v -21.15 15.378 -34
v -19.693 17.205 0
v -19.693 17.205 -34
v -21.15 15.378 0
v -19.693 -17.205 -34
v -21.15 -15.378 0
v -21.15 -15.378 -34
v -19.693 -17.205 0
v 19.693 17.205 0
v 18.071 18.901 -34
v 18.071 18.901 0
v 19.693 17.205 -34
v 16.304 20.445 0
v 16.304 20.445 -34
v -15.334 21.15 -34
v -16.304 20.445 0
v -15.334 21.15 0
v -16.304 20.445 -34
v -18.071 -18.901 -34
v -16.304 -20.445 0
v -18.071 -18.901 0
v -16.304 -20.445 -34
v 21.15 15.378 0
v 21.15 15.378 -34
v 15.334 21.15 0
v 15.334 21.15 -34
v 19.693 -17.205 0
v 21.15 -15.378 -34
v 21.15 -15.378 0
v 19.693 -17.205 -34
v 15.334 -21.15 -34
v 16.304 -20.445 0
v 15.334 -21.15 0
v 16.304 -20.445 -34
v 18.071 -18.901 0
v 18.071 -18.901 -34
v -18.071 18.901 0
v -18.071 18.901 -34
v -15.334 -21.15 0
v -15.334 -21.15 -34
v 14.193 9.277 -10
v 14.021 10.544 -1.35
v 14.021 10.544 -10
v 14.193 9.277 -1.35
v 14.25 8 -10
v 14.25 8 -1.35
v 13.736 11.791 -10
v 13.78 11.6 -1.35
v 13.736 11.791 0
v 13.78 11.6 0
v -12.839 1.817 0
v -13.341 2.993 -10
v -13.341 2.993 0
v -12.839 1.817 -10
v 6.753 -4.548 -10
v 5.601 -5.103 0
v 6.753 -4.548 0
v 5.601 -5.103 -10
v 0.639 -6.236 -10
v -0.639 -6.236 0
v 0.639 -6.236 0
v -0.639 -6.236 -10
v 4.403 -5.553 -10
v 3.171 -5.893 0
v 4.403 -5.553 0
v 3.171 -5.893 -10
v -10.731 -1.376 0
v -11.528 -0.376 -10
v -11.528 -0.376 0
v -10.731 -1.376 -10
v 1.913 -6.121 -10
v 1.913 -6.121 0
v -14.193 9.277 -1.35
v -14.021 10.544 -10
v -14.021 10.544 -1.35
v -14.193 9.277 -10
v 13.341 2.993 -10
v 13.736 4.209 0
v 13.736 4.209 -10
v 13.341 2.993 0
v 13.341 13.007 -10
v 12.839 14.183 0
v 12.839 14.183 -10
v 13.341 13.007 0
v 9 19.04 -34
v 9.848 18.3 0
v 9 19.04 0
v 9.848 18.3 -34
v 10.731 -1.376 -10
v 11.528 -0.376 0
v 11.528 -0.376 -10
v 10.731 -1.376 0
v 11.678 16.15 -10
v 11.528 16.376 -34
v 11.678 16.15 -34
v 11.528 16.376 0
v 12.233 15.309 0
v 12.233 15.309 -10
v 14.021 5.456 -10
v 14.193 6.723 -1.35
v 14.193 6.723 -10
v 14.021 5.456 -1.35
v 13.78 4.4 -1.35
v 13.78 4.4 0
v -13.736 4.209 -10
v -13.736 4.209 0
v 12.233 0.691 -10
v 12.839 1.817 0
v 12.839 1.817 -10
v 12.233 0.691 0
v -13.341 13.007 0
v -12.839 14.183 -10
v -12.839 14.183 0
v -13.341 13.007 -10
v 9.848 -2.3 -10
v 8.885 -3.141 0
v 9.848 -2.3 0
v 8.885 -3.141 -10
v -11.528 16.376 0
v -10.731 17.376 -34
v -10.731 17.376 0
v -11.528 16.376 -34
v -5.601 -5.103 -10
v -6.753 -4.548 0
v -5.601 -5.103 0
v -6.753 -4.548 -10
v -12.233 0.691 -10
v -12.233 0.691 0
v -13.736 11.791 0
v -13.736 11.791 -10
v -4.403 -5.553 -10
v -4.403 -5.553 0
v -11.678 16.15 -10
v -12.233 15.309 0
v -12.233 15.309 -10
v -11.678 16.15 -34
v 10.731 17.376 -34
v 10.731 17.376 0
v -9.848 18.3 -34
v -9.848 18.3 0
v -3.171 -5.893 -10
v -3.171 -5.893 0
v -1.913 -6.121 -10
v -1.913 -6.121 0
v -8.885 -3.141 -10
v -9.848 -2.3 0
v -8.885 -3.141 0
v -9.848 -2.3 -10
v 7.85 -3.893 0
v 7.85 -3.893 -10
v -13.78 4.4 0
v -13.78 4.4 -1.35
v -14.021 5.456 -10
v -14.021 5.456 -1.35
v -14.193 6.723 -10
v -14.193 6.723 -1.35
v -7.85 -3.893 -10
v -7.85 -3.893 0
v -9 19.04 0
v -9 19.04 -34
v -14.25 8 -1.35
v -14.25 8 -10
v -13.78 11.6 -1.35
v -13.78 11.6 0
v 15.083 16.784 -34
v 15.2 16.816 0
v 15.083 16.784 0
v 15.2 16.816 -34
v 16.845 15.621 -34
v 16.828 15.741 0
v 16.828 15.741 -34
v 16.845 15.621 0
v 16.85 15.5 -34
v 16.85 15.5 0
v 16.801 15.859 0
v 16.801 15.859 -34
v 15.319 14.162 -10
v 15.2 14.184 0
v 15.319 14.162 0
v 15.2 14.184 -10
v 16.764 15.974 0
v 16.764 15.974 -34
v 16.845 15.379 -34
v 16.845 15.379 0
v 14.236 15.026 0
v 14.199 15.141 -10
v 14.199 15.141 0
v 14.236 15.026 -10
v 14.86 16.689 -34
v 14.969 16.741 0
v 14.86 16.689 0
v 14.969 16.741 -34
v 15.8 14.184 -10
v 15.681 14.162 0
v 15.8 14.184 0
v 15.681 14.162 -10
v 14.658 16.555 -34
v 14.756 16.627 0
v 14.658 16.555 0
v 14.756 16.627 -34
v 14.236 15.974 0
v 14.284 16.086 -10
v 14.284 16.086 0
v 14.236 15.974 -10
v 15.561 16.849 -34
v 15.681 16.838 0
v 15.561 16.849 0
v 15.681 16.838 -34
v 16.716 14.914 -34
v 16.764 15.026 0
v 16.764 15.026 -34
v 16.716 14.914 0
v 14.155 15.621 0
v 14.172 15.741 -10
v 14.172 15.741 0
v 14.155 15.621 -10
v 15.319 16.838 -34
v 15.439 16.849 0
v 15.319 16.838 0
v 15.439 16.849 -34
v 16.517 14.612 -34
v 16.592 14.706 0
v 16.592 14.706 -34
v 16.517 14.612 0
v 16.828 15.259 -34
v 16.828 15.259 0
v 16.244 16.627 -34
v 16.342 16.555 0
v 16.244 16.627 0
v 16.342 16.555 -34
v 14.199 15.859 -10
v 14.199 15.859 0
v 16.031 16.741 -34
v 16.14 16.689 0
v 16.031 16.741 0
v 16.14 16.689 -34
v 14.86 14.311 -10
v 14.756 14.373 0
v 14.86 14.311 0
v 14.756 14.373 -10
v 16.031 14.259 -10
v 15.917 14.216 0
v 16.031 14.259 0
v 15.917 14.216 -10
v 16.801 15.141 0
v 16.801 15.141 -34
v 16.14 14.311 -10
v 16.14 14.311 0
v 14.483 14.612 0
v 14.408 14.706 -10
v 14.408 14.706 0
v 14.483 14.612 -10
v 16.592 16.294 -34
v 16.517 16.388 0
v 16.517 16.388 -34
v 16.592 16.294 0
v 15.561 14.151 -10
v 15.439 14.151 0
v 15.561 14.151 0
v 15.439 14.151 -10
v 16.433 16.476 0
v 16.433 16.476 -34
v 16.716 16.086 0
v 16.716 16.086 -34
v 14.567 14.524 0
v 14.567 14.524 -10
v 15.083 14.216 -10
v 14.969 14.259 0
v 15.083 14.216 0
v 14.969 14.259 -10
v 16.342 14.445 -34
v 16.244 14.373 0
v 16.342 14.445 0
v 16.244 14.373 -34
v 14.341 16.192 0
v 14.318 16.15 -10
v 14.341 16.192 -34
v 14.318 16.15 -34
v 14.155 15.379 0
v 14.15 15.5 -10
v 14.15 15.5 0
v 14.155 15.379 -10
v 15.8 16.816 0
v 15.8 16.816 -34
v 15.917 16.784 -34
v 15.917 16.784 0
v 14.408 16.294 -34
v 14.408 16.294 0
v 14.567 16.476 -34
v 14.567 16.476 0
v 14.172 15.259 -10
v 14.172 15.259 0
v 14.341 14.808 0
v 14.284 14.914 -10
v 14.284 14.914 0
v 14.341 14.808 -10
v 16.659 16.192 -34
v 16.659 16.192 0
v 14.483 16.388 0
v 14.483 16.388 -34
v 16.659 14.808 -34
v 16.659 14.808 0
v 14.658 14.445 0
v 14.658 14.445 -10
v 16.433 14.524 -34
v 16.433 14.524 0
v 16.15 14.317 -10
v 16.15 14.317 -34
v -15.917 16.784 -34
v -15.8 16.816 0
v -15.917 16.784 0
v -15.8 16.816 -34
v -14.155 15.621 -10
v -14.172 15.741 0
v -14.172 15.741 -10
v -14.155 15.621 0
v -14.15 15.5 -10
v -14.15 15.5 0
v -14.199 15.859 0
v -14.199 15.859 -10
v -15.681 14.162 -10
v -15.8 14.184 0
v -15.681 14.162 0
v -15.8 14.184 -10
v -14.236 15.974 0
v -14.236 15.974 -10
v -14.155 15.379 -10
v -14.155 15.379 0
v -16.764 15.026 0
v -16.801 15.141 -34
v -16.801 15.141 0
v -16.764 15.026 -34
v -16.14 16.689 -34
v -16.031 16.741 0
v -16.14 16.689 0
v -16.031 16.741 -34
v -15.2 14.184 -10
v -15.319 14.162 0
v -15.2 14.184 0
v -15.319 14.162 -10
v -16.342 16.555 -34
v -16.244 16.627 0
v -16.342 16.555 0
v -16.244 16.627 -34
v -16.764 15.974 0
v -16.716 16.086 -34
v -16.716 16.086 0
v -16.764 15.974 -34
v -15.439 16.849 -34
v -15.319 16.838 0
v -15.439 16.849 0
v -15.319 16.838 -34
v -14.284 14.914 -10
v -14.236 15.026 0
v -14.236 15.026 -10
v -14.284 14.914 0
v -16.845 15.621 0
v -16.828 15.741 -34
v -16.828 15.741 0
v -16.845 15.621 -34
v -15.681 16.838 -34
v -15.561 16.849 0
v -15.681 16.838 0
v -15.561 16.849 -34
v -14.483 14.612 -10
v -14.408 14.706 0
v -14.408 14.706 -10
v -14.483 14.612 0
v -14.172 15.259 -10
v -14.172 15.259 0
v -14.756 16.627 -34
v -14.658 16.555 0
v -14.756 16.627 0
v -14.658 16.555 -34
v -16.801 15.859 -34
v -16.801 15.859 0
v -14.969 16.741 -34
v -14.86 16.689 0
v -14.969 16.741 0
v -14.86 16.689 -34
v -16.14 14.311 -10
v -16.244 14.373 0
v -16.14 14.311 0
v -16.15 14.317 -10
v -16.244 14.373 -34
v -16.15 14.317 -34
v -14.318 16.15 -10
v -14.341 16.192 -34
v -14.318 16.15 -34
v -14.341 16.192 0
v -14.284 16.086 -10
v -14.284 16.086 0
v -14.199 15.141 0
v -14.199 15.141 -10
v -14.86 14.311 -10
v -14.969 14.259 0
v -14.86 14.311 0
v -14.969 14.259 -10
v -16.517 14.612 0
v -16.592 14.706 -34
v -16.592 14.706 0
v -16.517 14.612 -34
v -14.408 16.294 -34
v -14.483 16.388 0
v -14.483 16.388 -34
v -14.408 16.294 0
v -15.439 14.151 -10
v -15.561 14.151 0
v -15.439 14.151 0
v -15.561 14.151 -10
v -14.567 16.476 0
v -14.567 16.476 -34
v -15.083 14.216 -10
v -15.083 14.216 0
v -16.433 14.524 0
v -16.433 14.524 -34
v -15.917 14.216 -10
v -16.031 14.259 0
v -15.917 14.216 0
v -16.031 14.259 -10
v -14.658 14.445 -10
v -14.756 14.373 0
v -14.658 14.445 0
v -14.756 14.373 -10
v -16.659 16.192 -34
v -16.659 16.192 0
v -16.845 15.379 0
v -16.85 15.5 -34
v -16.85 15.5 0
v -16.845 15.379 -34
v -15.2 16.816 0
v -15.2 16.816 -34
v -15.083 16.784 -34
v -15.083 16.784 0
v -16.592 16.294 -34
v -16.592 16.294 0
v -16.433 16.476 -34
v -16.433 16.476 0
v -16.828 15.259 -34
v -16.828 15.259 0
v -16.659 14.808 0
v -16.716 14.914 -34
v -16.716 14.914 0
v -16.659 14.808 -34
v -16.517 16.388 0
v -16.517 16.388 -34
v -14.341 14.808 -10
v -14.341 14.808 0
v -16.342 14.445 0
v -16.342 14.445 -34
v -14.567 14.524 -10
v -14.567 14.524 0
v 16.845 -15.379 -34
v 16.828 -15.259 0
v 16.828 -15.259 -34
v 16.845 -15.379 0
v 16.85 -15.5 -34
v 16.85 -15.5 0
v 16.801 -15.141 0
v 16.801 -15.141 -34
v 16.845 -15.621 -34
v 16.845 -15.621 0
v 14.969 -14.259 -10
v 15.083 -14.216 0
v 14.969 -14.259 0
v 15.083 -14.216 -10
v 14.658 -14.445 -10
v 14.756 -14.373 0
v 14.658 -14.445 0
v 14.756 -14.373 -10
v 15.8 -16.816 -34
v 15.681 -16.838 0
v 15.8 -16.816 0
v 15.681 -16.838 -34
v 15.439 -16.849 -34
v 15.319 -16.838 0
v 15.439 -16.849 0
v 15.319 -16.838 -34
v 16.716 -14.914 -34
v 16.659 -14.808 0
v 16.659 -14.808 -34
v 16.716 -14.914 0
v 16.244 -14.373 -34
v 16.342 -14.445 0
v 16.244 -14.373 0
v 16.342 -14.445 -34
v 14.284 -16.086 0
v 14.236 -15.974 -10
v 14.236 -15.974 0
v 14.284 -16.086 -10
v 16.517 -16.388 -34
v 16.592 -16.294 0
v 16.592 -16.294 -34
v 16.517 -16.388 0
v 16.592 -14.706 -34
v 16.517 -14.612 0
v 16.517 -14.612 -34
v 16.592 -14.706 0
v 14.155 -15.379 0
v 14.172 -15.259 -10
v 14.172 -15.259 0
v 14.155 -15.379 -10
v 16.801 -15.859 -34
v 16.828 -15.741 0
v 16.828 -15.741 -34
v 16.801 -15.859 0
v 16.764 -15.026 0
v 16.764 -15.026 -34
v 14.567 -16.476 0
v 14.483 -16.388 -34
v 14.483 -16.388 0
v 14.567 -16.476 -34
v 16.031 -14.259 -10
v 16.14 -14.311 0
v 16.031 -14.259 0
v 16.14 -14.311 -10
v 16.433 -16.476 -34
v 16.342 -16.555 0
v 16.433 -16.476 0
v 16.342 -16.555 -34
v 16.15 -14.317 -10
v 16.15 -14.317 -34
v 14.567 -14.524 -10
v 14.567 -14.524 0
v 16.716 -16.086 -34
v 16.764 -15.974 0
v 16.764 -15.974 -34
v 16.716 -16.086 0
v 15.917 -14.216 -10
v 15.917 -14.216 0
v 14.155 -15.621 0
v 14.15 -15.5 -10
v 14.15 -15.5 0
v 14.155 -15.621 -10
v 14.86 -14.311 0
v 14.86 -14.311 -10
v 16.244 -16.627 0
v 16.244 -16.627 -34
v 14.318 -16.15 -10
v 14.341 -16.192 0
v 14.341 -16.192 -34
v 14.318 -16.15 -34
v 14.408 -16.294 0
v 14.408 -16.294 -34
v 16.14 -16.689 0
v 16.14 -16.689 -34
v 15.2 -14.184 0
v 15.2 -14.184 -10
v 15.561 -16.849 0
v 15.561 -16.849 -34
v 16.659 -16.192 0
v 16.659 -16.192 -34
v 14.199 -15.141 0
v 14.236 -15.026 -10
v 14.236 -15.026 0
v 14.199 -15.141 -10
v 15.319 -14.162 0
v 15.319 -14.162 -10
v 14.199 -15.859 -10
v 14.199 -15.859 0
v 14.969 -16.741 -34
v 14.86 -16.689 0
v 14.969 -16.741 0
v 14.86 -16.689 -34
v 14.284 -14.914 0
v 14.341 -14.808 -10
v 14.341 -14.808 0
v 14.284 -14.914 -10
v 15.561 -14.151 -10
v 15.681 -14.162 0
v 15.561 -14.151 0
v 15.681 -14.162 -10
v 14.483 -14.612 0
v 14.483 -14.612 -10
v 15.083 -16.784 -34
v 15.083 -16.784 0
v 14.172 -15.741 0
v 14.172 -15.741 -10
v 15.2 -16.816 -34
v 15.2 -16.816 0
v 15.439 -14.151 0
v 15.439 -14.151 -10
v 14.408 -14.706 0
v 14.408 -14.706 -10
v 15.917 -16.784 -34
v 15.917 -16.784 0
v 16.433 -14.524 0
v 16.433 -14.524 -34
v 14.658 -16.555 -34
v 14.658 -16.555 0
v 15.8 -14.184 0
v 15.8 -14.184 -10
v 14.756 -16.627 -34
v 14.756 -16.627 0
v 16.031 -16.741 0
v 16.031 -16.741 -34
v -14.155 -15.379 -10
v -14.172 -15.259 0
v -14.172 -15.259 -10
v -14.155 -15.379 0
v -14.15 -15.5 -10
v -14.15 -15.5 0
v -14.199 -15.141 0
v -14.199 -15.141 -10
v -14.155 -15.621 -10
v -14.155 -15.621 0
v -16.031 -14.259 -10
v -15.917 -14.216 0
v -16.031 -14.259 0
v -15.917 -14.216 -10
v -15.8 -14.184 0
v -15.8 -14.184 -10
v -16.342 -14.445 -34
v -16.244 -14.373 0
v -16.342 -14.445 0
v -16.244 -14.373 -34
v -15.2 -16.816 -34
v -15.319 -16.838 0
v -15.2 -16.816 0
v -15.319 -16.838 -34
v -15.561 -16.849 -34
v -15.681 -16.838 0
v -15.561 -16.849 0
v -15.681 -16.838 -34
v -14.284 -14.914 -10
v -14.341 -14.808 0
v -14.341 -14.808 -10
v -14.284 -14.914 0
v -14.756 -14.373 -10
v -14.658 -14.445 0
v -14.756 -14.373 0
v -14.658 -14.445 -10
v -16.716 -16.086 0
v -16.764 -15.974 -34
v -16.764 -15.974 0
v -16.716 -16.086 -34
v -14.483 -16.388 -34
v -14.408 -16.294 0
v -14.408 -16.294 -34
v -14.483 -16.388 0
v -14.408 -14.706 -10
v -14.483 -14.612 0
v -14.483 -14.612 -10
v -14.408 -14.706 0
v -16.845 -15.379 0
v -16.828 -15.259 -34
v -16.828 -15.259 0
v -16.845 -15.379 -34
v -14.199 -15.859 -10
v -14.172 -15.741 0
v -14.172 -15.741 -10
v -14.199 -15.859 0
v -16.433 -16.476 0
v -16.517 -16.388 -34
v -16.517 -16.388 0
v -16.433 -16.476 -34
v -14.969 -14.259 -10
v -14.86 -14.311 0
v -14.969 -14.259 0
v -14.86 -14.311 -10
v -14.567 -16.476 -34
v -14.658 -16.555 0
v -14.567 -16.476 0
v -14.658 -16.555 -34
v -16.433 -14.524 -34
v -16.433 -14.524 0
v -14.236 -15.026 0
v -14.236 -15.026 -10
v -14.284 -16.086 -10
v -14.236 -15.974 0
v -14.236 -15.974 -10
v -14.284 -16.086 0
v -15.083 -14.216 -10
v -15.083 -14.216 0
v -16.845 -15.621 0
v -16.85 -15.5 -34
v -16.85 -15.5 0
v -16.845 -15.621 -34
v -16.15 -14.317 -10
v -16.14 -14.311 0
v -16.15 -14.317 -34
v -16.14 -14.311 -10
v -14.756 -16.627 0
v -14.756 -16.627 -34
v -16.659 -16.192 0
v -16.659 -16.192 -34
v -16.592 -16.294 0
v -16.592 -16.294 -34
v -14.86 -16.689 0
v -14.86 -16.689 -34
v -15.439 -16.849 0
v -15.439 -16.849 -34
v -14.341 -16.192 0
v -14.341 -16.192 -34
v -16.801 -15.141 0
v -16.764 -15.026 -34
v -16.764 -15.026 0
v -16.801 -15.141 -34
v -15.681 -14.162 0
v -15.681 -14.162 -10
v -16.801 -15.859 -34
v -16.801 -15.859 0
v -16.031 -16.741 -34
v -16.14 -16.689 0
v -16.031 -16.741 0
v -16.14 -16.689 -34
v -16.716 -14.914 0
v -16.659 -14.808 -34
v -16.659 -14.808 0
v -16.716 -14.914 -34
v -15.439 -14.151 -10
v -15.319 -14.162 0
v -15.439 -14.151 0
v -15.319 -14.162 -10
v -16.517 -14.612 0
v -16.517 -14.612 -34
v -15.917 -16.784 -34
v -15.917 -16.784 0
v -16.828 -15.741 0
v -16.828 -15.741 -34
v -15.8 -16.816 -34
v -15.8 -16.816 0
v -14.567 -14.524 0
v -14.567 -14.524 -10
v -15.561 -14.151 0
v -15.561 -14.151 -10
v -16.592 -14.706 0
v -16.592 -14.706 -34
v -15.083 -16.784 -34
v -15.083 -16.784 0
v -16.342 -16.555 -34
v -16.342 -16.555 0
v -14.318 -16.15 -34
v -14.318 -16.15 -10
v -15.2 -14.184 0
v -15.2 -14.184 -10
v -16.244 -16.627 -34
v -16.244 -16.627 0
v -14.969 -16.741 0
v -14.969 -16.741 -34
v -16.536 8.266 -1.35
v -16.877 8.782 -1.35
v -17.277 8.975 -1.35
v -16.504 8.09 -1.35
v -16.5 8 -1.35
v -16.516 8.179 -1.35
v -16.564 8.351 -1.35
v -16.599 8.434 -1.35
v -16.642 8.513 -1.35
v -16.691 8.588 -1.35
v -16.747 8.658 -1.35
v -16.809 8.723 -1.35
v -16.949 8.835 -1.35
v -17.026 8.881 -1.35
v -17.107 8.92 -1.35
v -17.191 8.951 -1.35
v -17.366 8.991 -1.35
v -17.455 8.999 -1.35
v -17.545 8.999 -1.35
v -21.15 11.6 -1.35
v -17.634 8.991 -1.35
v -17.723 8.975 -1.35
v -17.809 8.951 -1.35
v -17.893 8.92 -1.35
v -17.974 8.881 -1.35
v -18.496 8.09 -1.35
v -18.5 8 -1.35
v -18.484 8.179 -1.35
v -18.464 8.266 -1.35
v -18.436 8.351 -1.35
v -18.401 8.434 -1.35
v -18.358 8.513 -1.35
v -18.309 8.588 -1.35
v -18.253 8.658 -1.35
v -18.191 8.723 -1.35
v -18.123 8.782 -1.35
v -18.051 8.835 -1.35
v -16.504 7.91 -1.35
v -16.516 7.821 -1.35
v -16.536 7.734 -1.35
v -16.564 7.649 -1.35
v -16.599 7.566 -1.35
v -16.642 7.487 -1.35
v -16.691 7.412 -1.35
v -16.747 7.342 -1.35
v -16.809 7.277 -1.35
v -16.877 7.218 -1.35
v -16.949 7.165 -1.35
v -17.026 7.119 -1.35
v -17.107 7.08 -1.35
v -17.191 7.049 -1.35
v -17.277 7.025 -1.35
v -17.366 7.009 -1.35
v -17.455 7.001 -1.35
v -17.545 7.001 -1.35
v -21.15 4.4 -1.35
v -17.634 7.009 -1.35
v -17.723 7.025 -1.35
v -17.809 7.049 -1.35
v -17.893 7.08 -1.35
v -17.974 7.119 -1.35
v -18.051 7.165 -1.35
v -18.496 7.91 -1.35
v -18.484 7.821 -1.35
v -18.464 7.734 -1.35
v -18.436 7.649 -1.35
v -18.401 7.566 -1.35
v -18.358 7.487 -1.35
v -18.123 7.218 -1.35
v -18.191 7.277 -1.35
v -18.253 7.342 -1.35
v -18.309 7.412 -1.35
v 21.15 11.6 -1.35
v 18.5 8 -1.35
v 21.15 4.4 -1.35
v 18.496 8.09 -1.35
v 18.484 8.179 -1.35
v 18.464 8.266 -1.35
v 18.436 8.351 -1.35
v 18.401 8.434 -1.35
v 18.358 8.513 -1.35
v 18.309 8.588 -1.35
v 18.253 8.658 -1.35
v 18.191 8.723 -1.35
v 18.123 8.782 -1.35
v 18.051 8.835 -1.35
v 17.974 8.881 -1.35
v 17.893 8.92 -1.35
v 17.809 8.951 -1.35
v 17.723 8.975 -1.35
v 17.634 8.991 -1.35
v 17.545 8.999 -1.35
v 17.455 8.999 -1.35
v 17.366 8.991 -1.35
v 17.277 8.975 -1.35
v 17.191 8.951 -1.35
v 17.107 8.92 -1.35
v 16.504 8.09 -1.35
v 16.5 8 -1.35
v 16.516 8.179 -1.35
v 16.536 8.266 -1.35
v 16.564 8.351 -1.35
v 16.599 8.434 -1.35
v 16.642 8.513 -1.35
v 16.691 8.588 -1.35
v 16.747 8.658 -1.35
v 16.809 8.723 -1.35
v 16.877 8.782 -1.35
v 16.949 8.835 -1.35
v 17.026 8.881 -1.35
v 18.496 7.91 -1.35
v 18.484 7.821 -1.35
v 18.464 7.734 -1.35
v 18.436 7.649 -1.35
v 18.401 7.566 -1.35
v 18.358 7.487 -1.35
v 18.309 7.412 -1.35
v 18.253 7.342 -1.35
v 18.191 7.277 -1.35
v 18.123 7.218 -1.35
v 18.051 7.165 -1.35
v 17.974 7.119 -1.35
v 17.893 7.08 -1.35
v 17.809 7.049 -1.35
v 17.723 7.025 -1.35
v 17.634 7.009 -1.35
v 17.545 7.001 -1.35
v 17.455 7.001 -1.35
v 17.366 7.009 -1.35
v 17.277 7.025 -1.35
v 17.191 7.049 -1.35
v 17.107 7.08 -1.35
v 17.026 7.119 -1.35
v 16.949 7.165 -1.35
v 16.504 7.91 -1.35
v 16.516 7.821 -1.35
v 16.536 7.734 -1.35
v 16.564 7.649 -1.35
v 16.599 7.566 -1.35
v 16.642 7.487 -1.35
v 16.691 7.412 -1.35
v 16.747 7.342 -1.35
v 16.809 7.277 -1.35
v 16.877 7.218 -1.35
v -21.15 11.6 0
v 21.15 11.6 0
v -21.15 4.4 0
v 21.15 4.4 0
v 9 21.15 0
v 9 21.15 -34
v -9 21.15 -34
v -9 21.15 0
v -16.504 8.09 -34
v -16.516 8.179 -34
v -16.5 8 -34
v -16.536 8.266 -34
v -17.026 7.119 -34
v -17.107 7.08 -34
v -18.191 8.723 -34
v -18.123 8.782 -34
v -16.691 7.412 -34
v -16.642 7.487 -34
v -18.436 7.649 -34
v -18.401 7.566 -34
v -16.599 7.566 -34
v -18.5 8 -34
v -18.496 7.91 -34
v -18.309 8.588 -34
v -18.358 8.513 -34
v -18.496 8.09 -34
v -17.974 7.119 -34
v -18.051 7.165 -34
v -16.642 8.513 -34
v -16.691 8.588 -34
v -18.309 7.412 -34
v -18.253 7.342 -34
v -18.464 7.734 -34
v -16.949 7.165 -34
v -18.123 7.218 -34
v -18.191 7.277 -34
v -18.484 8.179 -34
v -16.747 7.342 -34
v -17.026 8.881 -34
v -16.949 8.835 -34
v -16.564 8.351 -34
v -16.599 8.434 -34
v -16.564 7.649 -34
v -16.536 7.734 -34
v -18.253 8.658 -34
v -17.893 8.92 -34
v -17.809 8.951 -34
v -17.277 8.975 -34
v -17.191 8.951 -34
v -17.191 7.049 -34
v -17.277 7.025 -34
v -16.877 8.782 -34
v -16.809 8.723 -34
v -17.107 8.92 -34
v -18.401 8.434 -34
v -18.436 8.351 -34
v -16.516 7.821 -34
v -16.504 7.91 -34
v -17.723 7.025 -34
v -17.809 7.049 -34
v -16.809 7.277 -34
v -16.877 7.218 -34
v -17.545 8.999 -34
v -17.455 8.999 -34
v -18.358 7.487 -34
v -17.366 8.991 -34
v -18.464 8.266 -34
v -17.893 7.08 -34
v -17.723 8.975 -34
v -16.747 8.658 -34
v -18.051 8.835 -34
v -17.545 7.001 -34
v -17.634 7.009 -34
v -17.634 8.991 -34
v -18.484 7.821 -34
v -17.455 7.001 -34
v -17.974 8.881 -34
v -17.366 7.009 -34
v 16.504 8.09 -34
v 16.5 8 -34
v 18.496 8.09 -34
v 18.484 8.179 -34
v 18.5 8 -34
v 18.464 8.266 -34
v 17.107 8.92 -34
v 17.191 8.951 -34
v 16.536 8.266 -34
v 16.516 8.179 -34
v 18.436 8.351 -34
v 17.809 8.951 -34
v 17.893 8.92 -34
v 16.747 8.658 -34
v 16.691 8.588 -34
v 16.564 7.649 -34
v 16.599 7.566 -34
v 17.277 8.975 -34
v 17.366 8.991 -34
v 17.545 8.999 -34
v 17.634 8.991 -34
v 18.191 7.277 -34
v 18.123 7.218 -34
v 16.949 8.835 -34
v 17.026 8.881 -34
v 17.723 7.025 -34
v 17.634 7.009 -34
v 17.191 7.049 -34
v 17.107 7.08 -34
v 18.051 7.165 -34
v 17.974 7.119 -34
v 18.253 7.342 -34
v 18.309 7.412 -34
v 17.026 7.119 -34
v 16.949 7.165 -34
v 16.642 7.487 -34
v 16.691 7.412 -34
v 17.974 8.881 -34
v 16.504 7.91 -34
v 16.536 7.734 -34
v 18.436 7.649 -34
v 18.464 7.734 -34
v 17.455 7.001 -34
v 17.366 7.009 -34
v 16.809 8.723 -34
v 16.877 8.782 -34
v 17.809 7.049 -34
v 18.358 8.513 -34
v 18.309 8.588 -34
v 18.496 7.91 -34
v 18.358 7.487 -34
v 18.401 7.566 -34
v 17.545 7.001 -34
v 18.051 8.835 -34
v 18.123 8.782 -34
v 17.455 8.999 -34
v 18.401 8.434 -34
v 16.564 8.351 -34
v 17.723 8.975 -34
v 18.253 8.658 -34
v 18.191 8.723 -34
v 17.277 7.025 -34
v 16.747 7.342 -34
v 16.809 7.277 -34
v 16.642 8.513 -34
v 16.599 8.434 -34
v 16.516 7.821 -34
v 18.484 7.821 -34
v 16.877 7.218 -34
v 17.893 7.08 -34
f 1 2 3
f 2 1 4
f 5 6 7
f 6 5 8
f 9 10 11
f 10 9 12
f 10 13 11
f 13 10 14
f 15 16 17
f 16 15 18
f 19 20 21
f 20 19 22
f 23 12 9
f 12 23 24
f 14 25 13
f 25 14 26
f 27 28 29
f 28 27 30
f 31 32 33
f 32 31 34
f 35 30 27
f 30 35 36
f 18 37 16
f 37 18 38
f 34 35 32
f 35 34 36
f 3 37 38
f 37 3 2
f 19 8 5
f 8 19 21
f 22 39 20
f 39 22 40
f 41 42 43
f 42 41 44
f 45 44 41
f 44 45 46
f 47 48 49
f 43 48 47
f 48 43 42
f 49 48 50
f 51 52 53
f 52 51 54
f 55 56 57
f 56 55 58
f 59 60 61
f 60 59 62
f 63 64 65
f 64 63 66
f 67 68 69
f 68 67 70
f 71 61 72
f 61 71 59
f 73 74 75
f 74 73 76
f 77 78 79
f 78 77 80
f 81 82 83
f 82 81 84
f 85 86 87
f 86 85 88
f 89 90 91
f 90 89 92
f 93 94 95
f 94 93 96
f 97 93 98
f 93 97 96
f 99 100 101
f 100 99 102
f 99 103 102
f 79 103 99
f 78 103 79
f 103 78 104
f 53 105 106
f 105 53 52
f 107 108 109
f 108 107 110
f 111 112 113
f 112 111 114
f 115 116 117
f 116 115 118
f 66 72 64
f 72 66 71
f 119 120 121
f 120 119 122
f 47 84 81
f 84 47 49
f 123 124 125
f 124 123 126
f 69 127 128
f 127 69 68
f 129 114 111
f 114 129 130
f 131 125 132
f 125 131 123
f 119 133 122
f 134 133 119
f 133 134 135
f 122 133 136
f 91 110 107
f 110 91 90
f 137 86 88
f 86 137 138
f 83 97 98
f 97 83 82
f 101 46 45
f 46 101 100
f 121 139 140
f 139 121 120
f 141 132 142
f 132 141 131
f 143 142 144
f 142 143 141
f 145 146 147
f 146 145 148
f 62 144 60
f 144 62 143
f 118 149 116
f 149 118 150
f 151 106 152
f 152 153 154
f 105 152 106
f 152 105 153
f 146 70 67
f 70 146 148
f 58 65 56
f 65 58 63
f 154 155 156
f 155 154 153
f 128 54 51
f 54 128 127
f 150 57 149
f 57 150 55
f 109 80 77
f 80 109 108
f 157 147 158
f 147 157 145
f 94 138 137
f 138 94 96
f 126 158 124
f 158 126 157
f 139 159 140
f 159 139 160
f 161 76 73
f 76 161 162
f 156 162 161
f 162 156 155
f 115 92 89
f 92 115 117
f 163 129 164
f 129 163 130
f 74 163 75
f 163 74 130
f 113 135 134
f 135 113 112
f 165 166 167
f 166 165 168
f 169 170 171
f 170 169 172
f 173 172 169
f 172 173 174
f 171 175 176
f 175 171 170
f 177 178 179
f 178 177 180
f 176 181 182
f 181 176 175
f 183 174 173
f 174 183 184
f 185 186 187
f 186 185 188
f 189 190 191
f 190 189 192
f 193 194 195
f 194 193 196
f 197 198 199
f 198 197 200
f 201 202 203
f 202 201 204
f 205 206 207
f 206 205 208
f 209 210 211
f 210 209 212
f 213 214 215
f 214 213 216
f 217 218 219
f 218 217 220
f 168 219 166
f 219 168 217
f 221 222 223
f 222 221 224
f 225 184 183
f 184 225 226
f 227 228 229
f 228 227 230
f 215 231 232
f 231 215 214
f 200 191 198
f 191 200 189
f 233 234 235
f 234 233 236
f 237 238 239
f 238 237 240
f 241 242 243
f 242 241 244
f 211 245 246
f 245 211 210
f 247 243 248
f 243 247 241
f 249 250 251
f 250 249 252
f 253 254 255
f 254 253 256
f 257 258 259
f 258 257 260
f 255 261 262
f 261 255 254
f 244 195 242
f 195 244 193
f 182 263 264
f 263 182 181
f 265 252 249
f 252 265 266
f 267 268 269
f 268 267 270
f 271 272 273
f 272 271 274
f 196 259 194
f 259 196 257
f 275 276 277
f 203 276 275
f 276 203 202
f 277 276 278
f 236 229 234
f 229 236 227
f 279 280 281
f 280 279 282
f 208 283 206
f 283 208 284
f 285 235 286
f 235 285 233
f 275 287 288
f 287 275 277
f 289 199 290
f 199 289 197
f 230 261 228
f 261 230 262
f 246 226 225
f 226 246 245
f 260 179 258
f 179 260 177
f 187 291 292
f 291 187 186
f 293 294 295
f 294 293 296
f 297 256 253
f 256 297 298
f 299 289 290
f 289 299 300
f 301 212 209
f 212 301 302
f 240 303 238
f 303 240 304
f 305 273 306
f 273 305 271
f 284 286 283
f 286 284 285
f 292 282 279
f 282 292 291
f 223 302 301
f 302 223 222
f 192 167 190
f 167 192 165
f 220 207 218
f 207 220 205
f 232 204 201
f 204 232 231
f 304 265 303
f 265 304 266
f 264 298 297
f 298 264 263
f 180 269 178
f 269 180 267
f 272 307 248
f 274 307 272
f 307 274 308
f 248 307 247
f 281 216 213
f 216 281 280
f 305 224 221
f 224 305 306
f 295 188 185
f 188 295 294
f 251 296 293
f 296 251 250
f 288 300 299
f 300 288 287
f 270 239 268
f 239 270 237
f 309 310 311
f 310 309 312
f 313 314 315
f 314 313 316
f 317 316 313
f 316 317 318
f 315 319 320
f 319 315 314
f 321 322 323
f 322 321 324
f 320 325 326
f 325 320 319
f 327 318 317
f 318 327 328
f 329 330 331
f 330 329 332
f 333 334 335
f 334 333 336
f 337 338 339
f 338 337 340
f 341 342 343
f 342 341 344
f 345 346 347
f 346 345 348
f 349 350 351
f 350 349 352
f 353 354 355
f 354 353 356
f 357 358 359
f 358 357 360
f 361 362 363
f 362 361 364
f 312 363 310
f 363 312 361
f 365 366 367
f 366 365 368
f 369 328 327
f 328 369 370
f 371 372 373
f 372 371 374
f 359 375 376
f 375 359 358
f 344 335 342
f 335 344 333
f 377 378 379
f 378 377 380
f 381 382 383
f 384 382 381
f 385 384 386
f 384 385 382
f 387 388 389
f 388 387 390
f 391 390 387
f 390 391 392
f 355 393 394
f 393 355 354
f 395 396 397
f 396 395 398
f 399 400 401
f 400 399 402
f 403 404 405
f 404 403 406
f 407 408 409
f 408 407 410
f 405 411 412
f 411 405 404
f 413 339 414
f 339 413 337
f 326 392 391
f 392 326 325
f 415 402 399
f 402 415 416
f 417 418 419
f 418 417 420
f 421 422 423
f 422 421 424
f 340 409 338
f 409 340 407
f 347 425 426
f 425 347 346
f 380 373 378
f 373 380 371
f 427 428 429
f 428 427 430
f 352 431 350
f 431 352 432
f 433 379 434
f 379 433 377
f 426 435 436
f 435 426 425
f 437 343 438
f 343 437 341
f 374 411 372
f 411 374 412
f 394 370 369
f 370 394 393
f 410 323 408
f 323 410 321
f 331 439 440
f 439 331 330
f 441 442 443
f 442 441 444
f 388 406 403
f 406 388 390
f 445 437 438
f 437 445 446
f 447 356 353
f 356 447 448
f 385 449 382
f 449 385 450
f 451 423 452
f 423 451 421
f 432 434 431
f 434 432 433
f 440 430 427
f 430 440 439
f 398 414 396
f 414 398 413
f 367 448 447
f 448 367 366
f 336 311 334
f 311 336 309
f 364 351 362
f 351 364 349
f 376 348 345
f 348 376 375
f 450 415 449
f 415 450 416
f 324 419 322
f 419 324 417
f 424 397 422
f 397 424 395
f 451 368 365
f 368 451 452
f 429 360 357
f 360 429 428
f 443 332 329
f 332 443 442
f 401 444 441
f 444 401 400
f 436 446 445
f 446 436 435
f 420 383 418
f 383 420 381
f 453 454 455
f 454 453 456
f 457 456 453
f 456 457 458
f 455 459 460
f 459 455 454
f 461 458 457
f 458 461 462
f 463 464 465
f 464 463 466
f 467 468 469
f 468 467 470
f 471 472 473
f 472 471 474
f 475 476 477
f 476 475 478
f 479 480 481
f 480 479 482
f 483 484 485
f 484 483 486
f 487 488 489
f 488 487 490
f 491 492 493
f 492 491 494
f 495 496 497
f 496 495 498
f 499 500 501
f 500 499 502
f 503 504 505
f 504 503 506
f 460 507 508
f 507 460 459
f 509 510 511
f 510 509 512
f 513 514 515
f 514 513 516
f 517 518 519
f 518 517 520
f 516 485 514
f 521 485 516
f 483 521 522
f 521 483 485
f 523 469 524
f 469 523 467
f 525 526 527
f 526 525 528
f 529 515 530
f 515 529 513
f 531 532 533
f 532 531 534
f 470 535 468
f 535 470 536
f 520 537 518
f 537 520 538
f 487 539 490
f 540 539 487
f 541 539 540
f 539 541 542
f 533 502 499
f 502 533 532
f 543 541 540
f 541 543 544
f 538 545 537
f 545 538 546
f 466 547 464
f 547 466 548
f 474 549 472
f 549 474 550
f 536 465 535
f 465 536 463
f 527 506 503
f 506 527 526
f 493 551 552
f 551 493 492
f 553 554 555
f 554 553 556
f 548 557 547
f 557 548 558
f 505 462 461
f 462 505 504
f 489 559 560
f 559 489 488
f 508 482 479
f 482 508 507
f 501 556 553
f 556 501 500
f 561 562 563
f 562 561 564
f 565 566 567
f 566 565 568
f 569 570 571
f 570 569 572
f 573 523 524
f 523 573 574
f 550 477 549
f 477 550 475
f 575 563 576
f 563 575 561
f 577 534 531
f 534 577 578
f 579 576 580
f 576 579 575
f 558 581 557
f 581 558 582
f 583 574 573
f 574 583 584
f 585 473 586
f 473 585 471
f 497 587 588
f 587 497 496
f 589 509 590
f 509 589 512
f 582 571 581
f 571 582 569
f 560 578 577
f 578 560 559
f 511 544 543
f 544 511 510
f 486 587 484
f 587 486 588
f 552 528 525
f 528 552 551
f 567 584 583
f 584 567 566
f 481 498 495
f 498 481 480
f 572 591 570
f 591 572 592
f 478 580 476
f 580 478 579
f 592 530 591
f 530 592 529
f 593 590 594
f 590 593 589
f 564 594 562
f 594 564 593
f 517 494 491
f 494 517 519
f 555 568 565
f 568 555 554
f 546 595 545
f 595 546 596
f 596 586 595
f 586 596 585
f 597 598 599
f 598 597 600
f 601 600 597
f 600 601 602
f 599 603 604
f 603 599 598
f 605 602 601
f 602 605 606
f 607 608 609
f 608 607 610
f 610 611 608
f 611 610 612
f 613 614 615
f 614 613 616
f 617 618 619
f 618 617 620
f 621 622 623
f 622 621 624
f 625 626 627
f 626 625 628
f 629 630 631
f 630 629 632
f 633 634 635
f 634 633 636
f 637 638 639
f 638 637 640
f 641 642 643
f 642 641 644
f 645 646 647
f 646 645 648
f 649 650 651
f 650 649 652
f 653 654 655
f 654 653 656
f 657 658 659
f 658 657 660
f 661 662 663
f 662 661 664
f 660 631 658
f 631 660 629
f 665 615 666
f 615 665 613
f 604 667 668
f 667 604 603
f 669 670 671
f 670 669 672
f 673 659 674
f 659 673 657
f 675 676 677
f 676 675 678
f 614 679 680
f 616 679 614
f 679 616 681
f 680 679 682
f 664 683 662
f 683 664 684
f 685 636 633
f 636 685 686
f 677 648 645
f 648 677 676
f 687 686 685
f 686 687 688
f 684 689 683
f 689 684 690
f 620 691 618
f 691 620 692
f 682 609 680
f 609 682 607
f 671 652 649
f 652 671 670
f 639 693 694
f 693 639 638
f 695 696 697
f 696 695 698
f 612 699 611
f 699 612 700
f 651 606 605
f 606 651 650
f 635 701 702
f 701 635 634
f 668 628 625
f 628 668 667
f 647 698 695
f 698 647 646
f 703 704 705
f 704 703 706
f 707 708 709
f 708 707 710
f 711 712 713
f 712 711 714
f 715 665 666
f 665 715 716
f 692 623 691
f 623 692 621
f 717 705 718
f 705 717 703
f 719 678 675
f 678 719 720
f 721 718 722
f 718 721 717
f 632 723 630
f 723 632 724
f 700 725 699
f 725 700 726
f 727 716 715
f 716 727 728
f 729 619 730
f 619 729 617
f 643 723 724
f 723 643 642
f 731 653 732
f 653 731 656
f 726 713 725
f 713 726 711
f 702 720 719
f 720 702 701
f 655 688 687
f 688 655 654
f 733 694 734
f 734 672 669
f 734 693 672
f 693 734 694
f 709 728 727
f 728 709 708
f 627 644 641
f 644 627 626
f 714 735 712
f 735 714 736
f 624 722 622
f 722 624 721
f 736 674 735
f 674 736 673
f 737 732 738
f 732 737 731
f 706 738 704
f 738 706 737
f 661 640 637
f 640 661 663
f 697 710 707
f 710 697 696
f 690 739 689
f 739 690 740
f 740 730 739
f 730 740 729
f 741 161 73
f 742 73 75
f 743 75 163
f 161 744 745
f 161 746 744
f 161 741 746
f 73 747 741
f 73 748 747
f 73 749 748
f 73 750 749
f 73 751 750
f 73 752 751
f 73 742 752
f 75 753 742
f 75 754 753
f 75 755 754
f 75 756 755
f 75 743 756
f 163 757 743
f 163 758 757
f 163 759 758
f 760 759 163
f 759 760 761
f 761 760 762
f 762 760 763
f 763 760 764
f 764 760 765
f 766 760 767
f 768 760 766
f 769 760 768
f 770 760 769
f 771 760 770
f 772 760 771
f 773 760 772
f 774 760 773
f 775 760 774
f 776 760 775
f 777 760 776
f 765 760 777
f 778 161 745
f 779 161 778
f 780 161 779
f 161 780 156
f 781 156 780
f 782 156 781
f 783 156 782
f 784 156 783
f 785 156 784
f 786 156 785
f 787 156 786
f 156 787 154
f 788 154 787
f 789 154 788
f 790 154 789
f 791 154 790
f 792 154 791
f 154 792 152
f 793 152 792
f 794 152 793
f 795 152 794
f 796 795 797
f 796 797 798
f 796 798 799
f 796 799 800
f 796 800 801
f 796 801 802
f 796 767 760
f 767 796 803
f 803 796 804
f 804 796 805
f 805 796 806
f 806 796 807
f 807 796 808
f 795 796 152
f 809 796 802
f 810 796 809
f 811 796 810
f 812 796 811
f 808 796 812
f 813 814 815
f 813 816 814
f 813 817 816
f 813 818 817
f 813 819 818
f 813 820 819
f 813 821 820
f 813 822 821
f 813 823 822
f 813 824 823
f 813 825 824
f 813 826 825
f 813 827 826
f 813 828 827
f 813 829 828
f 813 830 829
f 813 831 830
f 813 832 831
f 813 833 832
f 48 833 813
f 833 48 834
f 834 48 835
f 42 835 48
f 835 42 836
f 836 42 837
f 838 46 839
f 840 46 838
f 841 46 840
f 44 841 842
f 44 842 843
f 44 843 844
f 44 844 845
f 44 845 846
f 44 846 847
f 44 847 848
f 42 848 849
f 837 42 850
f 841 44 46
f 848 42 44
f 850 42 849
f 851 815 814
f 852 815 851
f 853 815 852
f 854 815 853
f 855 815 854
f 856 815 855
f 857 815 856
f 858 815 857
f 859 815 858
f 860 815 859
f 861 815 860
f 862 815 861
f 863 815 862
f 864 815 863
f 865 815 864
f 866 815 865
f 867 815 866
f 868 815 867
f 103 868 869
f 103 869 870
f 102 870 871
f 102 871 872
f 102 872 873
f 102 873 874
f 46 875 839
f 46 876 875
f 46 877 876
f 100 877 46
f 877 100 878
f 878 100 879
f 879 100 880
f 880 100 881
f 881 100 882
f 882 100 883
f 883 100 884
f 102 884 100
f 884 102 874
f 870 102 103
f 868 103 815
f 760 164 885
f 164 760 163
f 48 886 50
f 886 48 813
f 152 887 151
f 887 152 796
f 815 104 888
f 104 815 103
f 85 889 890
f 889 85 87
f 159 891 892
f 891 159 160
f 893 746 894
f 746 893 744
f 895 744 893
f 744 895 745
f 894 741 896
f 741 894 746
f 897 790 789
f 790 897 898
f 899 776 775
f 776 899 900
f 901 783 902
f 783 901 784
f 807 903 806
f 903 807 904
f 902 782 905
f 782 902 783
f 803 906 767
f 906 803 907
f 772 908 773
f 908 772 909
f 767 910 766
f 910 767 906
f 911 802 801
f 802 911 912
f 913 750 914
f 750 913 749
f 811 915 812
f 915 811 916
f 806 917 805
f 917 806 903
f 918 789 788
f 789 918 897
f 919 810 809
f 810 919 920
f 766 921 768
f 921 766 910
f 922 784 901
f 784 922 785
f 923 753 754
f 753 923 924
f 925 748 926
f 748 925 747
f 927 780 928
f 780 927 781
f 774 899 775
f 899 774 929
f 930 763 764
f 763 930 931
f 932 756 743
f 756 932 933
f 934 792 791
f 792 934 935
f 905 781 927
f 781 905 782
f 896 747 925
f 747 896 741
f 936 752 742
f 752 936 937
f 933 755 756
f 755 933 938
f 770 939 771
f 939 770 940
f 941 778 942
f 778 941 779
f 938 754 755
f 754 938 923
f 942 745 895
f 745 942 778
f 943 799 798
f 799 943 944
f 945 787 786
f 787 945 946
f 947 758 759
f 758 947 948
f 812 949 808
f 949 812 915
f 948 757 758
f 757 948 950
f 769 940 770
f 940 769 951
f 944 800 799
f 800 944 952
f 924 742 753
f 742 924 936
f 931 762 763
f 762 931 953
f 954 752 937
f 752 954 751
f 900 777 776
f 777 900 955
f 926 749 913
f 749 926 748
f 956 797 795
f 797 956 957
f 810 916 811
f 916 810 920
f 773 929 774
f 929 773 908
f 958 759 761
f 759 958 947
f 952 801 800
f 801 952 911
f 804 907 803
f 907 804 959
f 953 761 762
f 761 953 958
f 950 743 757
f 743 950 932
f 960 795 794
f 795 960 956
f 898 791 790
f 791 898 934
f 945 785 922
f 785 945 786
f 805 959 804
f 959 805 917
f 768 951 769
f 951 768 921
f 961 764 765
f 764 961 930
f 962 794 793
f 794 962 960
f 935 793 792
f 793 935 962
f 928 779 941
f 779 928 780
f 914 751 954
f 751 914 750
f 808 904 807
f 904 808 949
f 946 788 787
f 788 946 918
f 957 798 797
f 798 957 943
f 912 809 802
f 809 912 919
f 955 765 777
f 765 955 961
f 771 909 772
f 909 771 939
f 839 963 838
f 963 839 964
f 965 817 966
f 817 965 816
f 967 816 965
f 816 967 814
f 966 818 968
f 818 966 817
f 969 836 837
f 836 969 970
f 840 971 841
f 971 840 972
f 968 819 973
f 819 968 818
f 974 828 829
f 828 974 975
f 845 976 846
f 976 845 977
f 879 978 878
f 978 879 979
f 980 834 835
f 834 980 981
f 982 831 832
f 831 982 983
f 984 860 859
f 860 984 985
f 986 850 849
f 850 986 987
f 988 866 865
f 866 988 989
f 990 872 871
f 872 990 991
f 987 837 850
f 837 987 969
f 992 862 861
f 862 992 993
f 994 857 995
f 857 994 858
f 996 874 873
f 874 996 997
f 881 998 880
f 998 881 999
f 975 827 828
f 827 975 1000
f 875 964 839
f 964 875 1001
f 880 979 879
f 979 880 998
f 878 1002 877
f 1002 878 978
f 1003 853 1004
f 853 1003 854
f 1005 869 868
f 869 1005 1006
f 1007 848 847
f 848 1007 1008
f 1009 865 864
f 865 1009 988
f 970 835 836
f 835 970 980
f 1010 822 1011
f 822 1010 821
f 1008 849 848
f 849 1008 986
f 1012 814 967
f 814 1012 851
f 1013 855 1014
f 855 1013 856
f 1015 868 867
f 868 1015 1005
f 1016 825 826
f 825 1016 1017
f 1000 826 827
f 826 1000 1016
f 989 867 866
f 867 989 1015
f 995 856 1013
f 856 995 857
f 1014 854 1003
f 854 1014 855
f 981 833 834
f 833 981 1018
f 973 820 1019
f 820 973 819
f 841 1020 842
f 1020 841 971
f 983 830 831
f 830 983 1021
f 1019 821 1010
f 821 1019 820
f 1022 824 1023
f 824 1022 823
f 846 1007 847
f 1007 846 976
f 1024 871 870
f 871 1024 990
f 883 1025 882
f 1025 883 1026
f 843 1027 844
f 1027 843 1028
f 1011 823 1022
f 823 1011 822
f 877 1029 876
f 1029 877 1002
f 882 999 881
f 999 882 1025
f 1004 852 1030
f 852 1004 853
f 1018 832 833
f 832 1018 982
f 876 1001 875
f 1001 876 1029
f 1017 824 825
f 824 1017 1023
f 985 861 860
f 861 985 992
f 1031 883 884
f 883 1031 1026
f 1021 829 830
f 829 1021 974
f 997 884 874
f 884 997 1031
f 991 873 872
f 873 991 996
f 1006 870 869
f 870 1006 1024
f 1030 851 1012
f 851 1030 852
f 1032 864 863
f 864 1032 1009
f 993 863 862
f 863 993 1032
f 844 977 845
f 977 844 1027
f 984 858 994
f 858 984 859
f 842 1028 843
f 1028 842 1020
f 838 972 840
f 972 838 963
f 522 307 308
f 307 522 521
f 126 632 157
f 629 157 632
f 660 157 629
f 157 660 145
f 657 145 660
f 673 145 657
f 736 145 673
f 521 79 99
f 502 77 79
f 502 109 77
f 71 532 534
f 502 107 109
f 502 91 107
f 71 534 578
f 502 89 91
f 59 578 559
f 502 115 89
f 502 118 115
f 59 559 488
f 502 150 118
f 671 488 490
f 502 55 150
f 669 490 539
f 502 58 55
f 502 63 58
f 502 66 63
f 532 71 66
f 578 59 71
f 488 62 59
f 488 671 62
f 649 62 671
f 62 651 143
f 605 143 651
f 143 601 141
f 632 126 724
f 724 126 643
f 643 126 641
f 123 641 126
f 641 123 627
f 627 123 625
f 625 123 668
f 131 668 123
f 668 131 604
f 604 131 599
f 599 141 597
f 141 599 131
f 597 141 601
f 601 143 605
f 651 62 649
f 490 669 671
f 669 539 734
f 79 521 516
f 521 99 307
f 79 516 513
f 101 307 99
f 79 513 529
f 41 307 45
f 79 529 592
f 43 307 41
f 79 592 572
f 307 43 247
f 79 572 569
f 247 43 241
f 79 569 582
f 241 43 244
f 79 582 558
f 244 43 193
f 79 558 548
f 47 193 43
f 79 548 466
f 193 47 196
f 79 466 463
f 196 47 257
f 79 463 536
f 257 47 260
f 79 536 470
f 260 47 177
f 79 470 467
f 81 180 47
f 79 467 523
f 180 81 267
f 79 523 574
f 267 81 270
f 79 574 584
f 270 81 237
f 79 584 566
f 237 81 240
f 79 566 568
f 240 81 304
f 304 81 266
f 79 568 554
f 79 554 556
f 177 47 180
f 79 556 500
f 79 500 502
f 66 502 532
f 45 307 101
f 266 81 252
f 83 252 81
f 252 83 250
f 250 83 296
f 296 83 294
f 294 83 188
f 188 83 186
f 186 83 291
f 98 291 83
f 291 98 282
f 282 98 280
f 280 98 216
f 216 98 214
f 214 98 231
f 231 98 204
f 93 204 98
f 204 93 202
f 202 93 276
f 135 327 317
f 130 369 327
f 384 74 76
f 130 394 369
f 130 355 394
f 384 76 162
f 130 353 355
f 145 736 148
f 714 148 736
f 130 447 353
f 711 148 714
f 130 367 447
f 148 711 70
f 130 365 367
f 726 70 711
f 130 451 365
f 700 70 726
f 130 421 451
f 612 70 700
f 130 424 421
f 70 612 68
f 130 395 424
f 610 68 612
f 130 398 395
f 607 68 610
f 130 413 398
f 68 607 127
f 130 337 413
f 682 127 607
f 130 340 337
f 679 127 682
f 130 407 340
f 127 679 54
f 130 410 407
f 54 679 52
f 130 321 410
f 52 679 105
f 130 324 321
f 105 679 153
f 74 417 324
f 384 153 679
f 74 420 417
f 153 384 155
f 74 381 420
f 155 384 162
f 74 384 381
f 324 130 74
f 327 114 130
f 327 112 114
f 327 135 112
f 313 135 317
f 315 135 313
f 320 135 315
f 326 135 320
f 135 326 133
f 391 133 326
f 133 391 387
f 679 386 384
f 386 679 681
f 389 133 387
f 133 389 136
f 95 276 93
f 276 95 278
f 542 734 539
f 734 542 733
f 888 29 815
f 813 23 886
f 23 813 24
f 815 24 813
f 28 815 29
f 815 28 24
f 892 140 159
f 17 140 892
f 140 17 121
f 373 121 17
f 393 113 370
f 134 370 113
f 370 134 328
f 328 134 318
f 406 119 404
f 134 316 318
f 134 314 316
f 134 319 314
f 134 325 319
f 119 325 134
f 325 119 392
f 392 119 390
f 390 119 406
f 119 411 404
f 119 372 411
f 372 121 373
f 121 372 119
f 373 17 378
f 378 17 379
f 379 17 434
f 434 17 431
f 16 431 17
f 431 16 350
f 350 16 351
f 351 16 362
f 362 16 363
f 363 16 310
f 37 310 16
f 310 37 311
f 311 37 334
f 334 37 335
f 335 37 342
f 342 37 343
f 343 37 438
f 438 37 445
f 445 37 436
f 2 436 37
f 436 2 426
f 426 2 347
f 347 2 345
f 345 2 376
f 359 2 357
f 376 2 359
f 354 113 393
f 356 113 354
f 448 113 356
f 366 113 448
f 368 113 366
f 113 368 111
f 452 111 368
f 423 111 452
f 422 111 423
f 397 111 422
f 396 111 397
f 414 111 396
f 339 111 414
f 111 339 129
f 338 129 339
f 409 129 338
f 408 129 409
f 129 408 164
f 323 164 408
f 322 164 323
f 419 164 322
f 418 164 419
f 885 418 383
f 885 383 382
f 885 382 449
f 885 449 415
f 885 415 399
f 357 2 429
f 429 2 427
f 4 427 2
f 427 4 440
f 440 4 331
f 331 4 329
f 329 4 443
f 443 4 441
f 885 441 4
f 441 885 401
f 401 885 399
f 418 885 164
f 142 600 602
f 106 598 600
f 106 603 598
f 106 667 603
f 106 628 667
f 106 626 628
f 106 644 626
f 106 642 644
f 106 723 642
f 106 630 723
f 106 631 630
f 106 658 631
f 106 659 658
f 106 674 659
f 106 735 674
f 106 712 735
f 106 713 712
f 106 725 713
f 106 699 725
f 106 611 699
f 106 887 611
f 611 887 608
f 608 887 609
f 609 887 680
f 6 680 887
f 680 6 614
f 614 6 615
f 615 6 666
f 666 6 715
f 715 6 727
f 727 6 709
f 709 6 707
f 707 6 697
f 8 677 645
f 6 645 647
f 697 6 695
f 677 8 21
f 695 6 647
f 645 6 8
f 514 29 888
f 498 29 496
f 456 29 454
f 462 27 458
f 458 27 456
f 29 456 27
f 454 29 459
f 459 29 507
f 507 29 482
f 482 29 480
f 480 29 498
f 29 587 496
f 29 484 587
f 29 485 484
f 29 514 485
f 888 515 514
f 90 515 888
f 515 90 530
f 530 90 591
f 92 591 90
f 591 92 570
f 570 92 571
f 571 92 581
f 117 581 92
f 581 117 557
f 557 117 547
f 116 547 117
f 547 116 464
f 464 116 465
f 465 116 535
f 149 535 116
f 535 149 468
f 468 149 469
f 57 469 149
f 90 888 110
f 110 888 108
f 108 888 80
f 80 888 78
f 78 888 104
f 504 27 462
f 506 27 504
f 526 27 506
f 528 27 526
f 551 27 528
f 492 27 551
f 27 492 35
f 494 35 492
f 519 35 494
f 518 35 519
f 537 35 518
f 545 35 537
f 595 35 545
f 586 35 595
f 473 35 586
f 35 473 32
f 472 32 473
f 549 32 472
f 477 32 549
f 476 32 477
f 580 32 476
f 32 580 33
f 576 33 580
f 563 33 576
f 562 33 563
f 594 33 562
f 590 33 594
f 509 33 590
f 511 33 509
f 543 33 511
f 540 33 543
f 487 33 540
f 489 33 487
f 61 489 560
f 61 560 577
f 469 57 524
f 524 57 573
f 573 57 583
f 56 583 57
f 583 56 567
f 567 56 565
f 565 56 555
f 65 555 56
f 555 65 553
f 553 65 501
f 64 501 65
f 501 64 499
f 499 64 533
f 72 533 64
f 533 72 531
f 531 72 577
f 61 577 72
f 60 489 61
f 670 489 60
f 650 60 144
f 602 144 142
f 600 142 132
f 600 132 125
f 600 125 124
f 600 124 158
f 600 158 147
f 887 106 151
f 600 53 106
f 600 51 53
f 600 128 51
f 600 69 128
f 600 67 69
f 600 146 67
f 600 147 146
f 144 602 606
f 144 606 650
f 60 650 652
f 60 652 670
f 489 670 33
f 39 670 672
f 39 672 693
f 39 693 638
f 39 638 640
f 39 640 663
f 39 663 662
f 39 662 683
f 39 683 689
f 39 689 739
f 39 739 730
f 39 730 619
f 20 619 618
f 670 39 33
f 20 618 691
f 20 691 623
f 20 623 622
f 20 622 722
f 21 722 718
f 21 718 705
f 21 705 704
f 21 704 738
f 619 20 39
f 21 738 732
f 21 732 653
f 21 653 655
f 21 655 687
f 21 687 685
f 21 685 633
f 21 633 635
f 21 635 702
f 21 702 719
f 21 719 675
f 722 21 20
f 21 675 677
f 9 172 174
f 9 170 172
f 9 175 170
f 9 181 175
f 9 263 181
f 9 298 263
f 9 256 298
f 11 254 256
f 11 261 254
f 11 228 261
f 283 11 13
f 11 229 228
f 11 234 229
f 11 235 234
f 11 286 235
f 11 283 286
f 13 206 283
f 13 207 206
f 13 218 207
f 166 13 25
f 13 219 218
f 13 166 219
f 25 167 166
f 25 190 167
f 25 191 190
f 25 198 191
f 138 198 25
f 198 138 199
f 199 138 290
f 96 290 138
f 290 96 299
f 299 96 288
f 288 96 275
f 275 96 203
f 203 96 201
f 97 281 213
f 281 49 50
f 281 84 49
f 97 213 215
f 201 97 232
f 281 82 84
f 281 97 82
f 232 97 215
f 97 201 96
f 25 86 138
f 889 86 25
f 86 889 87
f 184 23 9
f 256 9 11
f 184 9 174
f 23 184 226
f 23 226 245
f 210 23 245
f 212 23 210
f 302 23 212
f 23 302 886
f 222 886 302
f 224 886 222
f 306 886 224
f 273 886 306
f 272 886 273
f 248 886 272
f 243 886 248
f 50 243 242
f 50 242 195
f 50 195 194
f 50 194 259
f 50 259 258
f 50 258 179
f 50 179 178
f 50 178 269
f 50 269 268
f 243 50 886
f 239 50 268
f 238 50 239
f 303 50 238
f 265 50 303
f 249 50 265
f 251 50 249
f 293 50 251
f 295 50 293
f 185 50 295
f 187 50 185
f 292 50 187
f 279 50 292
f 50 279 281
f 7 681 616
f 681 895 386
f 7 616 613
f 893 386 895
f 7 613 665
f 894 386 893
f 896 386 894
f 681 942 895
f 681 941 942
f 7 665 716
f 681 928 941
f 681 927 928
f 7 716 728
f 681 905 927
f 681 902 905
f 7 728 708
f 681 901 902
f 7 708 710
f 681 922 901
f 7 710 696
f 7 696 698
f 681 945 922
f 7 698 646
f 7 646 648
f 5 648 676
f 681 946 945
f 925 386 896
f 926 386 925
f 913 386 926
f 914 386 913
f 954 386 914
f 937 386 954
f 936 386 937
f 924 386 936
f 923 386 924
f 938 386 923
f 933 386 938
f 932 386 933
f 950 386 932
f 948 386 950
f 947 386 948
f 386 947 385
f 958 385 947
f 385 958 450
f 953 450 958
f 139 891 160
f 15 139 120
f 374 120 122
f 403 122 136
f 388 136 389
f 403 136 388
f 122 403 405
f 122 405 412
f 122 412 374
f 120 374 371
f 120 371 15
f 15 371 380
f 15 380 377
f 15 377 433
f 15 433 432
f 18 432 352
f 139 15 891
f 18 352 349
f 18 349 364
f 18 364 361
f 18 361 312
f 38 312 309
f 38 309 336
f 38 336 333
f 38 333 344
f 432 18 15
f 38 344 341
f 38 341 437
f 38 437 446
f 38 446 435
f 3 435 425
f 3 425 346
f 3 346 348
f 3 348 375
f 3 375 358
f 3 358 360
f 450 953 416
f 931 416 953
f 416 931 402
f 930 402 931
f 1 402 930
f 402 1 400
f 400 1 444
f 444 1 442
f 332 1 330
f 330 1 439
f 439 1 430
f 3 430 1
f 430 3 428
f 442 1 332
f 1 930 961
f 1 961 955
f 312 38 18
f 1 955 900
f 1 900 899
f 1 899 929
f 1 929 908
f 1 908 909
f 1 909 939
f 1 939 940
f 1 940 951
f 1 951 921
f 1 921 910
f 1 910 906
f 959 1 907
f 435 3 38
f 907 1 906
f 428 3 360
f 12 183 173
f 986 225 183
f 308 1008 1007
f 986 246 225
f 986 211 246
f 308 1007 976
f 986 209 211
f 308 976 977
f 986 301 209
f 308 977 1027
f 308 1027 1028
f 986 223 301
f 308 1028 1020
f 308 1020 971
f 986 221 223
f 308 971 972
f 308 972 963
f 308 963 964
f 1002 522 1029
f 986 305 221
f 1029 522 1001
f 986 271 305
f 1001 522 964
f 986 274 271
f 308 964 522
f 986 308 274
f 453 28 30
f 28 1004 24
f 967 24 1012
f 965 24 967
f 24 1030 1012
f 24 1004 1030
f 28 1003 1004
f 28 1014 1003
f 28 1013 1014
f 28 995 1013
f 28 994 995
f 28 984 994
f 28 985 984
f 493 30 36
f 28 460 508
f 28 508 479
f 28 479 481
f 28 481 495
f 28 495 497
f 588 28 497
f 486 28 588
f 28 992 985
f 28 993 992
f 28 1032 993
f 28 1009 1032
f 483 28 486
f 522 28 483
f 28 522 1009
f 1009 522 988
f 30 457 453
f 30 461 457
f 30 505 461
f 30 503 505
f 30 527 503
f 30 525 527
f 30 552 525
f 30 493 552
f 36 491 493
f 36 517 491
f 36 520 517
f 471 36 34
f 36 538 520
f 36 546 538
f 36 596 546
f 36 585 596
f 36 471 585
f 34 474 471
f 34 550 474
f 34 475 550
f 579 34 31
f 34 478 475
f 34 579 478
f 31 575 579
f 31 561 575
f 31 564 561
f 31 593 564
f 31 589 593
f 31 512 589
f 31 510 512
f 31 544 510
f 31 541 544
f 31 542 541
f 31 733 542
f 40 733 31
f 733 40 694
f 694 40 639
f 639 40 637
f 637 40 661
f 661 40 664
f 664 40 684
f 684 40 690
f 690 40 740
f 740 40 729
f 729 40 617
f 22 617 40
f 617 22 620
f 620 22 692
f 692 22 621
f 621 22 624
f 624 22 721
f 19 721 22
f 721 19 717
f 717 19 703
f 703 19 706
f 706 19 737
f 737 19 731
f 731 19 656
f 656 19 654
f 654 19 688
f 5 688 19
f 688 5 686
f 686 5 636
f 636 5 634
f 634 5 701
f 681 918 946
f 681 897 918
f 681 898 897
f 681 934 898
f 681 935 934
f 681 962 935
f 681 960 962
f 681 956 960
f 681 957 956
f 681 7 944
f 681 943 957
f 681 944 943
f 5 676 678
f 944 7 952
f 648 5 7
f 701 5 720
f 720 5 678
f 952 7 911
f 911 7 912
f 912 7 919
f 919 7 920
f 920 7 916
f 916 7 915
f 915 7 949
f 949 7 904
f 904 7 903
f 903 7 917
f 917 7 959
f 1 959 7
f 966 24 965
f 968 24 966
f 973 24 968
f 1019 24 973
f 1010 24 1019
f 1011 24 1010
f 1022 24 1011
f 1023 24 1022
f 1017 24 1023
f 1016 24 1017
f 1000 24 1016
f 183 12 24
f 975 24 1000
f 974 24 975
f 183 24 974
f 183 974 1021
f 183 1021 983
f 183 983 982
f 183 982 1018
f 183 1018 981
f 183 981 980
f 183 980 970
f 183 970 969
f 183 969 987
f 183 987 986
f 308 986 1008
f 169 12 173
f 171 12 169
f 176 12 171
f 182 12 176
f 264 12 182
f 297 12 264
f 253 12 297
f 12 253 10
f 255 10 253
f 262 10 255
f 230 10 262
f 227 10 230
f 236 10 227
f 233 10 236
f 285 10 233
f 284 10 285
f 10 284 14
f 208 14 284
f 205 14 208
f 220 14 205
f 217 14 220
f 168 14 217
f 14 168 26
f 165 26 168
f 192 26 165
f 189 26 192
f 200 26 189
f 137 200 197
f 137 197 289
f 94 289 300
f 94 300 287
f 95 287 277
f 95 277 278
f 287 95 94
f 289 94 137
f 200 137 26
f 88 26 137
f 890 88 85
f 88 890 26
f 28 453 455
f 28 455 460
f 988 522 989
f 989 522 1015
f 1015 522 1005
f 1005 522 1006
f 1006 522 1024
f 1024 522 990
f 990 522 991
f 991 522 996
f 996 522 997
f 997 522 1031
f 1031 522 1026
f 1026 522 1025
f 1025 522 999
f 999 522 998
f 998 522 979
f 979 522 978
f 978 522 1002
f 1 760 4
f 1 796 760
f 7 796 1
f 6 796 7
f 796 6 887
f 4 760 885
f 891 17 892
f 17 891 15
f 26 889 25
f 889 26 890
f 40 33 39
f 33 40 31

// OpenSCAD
/* 
***************************************************************************
    Adapter from motor 28BY-48 to motor 17HS
    Copyright (C) 2016 Andrey Kostin

    This program is free software: you can redistribute it and/or modify
    it under the terms of the GNU General Public License as published by
    the Free Software Foundation, either version 3 of the License, or
     any later version.

    This program is distributed in the hope that it will be useful,
    but WITHOUT ANY WARRANTY.
    See the GNU General Public License for more details.

************************************************************************* 
*/

//height motor
ht = 34;//17HS42

//width motor
a = 42.3; //17HS42

//distance from hole to surface motor
kd =5.65;

$fn = 70;

stepper = false;

color("lightblue")
adp();

if (stepper) {
    color("lightgray")
    translate([0,8,-9.5])
    scale([10,10,10])
    import("StepMotorModel.stl");
}

module adp() {
    difference(){   
        
    translate(v=[0,0,-ht/2]){
    cube([a,a,ht], center=true);
    }
    union(){        
        
    //case 28BY-48
    translate(v=[0,8,-(ht+1)]){
    cylinder(h=ht+2,r1=28.5/2,r2=28.5/2);
    }
    translate(v=[((a/2)-kd),((a/2)-kd),-(ht+1)]){
    cylinder(h=ht+2,r1=2.7/2,r2=2.7/2);
    }
    translate(v=[-((a/2)-kd),((a/2)-kd),-(ht+1)]){
    cylinder(h=ht+2,r1=2.7/2,r2=2.7/2);
    }
    translate(v=[((a/2)-kd),-((a/2)-kd),-(ht+1)]){
    cylinder(h=ht+2,r1=2.7/2,r2=2.7/2);
    }
    translate(v=[-((a/2)-kd),-((a/2)-kd),-(ht+1)]){
    cylinder(h=ht+2,r1=2.7/2,r2=2.7/2);
    }
    //mount 28BY-48
    translate(v=[0,8,-1/2]){
    cube([a+2,7.2,1.7], center=true);
    }
    //side box 28BY-48
    translate(v=[0,((28.5/2)+8),-(ht/2)]){
    cube([18,8,(ht+2)], center=true);
    }
    //the bolts 28BY-48
    translate(v=[-35/2,8,-(ht+2)]){
    cylinder(h=ht+4,r1=1,r2=1);
    }
    translate(v=[35/2,8,-(ht+2)]){
    cylinder(h=ht+4,r1=1,r2=1);
    }
    translate(v=[0,0,-((ht/2)+10)]){
    cube([(a-10),(a-10),ht], center=true);
    }
    //cylinder for smooth edges
    difference(){   
    translate(v=[0,0,-(ht+1)]){    
    cylinder(h=ht+4,r1=a+5,r2=a+5);
    }
    translate(v=[0,0,-(ht+2)]){
    cylinder(h=ht+6,r1=a/2+5,r2=a/2+5);}
    }
    }
    }
}
